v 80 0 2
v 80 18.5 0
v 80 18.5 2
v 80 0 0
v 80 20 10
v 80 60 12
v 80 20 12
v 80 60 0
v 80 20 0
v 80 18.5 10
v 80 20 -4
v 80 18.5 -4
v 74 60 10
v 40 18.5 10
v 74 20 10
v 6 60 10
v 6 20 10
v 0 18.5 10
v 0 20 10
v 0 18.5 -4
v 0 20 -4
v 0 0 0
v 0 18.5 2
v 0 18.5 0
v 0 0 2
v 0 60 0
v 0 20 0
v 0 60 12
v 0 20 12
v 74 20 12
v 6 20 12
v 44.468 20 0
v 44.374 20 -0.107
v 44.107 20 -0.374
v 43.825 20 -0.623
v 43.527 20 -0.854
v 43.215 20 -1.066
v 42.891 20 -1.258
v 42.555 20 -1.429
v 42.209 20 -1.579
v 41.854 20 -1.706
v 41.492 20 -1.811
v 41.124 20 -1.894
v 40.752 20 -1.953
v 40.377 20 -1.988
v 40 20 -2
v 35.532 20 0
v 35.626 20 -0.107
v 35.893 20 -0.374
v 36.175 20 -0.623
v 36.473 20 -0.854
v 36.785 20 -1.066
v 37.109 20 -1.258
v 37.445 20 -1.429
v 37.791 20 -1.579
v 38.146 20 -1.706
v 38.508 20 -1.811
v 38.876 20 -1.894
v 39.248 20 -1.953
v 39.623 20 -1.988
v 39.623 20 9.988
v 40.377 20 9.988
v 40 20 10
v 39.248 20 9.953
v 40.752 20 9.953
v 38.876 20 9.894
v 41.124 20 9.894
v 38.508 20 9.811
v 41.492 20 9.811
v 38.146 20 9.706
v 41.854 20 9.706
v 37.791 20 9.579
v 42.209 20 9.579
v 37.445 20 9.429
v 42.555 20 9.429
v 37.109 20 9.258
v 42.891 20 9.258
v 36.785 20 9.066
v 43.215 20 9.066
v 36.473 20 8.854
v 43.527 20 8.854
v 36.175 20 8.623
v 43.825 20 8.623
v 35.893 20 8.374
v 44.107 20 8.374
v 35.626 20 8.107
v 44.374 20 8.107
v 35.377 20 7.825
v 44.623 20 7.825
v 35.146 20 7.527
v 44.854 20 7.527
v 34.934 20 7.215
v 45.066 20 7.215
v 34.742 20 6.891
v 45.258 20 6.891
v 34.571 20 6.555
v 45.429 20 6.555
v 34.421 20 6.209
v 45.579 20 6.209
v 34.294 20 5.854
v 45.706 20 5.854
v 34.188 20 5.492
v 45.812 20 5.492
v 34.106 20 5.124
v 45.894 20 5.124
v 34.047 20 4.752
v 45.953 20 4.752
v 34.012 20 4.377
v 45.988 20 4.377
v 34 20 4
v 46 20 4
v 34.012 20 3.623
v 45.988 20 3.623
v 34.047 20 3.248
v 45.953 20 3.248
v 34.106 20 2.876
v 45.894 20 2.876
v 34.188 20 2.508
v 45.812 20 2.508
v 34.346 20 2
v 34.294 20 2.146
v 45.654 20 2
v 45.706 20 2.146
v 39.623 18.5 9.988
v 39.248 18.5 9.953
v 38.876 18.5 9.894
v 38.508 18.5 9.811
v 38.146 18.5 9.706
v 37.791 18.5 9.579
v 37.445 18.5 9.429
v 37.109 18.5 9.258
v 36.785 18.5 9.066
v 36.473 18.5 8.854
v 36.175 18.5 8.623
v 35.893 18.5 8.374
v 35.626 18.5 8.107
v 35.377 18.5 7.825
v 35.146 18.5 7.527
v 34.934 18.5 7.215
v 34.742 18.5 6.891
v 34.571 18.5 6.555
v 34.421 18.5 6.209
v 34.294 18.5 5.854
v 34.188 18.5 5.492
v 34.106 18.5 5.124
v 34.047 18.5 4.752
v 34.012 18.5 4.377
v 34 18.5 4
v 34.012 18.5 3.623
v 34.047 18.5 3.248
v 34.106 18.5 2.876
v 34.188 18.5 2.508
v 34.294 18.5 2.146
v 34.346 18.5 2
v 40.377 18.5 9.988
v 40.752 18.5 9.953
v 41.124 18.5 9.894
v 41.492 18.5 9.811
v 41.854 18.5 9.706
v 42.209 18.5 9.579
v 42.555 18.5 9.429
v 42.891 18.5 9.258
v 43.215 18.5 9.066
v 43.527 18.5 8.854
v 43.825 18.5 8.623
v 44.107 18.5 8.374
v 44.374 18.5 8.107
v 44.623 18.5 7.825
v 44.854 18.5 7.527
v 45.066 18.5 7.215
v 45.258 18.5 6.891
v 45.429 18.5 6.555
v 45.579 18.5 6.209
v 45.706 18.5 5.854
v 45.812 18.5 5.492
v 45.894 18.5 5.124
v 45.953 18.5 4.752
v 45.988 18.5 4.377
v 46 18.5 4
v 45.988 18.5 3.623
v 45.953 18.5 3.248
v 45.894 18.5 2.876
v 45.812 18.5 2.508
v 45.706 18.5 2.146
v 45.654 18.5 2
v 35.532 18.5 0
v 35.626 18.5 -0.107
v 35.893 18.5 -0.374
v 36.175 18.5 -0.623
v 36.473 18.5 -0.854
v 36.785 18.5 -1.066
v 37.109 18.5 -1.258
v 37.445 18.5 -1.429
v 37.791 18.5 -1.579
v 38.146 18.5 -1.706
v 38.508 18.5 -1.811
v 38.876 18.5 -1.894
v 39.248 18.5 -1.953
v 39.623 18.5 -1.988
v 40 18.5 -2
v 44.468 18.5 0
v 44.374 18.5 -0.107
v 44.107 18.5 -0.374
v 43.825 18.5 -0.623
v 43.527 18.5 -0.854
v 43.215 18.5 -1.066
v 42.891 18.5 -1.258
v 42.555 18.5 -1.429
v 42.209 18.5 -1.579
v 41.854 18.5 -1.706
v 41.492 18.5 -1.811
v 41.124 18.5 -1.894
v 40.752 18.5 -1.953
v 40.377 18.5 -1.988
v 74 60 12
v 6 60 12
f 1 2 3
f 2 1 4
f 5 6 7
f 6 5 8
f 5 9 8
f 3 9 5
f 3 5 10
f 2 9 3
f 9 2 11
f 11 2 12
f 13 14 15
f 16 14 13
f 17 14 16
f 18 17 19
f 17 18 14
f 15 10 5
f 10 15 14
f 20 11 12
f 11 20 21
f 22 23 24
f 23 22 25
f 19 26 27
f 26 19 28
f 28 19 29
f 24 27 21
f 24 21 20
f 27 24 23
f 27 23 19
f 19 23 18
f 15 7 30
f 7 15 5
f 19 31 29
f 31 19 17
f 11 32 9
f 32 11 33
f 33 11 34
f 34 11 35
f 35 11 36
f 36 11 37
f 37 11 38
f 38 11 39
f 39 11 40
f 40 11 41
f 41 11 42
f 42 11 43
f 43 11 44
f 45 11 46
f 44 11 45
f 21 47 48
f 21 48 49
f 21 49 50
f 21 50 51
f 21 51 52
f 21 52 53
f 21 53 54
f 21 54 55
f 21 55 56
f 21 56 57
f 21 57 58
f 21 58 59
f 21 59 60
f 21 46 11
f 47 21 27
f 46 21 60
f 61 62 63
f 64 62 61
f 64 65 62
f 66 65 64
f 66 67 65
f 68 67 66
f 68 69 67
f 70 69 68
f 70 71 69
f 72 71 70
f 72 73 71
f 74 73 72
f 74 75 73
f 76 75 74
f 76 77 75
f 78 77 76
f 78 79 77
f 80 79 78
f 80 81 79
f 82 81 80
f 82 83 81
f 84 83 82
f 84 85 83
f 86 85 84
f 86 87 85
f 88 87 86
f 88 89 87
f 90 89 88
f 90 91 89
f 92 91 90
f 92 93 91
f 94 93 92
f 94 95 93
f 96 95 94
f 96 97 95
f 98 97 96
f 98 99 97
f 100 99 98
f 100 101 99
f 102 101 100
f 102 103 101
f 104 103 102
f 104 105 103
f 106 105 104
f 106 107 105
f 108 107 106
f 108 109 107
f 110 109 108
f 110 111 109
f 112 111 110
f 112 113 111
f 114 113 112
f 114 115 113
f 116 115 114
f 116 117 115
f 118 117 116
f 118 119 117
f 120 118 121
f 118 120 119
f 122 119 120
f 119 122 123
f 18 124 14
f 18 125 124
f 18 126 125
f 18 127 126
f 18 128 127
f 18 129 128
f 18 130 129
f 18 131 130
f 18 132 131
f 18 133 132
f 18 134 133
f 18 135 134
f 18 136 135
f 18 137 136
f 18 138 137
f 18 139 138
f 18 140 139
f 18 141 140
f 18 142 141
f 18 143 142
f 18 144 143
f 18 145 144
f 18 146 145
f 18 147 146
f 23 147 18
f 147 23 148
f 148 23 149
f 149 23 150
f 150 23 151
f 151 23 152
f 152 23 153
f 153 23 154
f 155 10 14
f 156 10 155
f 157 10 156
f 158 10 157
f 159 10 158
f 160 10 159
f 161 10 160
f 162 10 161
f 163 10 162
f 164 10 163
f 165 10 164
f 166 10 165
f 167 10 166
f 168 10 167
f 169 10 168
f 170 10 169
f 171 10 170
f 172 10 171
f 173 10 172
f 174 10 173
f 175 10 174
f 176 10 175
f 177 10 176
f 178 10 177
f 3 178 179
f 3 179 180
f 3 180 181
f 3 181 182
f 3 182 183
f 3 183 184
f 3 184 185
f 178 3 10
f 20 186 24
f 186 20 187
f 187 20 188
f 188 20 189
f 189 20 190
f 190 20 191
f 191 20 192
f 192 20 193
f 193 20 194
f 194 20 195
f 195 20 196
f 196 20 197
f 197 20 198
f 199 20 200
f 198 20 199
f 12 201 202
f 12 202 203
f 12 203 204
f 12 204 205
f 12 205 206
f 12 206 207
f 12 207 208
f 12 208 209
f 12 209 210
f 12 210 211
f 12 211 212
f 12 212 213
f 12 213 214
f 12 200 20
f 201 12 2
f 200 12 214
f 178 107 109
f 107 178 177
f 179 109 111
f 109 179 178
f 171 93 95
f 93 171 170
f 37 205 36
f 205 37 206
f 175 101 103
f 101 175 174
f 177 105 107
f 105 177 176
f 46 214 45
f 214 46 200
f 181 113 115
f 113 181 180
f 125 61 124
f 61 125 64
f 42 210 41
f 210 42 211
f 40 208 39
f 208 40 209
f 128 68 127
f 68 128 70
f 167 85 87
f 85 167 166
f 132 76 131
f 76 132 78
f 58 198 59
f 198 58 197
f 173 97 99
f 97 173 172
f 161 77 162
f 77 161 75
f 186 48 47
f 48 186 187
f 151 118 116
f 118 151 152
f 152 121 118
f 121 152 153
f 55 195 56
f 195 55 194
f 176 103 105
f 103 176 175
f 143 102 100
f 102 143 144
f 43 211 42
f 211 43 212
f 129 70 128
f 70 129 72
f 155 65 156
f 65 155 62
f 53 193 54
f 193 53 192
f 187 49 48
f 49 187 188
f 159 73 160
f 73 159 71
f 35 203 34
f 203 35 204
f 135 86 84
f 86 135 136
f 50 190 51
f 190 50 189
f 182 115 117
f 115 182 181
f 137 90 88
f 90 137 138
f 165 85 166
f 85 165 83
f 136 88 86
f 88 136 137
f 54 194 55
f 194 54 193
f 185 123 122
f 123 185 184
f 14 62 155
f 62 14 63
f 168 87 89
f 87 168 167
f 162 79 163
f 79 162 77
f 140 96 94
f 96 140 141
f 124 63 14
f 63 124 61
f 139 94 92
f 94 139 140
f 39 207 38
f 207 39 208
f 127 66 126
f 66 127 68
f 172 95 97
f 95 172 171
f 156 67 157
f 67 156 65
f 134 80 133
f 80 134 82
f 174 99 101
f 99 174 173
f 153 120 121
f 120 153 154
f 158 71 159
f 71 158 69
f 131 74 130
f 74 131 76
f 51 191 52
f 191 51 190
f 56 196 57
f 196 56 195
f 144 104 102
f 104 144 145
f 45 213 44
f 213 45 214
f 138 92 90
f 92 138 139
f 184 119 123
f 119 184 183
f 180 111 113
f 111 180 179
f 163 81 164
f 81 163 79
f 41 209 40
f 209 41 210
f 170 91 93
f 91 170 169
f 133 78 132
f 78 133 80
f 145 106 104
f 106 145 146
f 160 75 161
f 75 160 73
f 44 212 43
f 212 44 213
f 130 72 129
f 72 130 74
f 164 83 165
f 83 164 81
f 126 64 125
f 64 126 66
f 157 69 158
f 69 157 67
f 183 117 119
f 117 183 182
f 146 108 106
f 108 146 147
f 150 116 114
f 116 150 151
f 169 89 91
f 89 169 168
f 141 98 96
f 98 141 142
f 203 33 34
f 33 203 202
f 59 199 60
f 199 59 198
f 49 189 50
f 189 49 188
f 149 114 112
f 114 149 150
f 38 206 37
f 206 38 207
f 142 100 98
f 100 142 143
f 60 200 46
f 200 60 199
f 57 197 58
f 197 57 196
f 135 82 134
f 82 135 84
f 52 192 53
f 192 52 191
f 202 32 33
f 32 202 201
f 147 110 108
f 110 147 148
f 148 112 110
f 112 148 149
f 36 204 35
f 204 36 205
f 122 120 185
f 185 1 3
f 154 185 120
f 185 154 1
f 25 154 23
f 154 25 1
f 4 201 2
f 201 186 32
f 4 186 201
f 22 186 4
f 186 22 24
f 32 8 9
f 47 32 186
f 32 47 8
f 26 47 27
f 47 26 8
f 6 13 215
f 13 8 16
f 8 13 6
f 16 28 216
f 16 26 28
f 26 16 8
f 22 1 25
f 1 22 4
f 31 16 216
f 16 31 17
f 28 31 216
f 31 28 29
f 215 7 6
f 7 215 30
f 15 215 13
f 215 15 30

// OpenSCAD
// Resolution for curved surfaces
$fn = 100;

// --- Base slab dimensions ---
base_w        = 80;   // Overall width
base_d        = 60;   // Overall depth
base_h        = 2;    // Thin slab thickness

// --- Rear raised block ---
rear_d        = 40;   // Depth of rear raised portion
rear_h        = 8;    // Height added above base

// --- Narrow side strips (shallow added material) ---
strip_w       = 6;    // Width of each side strip
strip_h       = 2;    // Shallow rise above rear block

// --- Transverse thin web (aligned continuation reaching deeper) ---
web_t         = 1.5;  // Thickness (front-to-back)
web_z_bottom  = -4;   // How far below base it reaches
web_z_top     = base_h + rear_h; // Top flush with rear block shoulder
hole_d        = 12;   // Diameter of real internal opening
hole_z        = 4;    // Vertical center of hole (above base, inside web)

// --- Derived positions ---
rear_y        = base_d - rear_d;          // Front edge of rear block (the shoulder)
web_y         = rear_y - web_t;           // Web sits immediately in front of shoulder

// Base slab
module base_slab() {
    cube([base_w, base_d, base_h]);
}

// Larger rear raised portion
module rear_block() {
    translate([0, rear_y, base_h])
        cube([base_w, rear_d, rear_h]);
}

// Narrow raised strip along one side of rear block
module side_strip(x_pos) {
    translate([x_pos, rear_y, base_h + rear_h])
        cube([strip_w, rear_d, strip_h]);
}

// Very thin transverse web with real internal opening
module transverse_web() {
    difference() {
        // Solid thin plate spanning full width, reaching deeper than base
        translate([0, web_y, web_z_bottom])
            cube([base_w, web_t, web_z_top - web_z_bottom]);
        
        // Real internal opening (cylinder axis along web thickness)
        translate([base_w / 2, web_y + web_t / 2, hole_z])
            rotate([90, 0, 0])
            cylinder(d = hole_d, h = web_t + 1, center = true);
    }
}

// Assembly: all material added to base slab
union() {
    base_slab();
    rear_block();
    side_strip(0);                      // Left strip
    side_strip(base_w - strip_w);       // Right strip
    transverse_web();                   // Thin web at shoulder with hole
}
